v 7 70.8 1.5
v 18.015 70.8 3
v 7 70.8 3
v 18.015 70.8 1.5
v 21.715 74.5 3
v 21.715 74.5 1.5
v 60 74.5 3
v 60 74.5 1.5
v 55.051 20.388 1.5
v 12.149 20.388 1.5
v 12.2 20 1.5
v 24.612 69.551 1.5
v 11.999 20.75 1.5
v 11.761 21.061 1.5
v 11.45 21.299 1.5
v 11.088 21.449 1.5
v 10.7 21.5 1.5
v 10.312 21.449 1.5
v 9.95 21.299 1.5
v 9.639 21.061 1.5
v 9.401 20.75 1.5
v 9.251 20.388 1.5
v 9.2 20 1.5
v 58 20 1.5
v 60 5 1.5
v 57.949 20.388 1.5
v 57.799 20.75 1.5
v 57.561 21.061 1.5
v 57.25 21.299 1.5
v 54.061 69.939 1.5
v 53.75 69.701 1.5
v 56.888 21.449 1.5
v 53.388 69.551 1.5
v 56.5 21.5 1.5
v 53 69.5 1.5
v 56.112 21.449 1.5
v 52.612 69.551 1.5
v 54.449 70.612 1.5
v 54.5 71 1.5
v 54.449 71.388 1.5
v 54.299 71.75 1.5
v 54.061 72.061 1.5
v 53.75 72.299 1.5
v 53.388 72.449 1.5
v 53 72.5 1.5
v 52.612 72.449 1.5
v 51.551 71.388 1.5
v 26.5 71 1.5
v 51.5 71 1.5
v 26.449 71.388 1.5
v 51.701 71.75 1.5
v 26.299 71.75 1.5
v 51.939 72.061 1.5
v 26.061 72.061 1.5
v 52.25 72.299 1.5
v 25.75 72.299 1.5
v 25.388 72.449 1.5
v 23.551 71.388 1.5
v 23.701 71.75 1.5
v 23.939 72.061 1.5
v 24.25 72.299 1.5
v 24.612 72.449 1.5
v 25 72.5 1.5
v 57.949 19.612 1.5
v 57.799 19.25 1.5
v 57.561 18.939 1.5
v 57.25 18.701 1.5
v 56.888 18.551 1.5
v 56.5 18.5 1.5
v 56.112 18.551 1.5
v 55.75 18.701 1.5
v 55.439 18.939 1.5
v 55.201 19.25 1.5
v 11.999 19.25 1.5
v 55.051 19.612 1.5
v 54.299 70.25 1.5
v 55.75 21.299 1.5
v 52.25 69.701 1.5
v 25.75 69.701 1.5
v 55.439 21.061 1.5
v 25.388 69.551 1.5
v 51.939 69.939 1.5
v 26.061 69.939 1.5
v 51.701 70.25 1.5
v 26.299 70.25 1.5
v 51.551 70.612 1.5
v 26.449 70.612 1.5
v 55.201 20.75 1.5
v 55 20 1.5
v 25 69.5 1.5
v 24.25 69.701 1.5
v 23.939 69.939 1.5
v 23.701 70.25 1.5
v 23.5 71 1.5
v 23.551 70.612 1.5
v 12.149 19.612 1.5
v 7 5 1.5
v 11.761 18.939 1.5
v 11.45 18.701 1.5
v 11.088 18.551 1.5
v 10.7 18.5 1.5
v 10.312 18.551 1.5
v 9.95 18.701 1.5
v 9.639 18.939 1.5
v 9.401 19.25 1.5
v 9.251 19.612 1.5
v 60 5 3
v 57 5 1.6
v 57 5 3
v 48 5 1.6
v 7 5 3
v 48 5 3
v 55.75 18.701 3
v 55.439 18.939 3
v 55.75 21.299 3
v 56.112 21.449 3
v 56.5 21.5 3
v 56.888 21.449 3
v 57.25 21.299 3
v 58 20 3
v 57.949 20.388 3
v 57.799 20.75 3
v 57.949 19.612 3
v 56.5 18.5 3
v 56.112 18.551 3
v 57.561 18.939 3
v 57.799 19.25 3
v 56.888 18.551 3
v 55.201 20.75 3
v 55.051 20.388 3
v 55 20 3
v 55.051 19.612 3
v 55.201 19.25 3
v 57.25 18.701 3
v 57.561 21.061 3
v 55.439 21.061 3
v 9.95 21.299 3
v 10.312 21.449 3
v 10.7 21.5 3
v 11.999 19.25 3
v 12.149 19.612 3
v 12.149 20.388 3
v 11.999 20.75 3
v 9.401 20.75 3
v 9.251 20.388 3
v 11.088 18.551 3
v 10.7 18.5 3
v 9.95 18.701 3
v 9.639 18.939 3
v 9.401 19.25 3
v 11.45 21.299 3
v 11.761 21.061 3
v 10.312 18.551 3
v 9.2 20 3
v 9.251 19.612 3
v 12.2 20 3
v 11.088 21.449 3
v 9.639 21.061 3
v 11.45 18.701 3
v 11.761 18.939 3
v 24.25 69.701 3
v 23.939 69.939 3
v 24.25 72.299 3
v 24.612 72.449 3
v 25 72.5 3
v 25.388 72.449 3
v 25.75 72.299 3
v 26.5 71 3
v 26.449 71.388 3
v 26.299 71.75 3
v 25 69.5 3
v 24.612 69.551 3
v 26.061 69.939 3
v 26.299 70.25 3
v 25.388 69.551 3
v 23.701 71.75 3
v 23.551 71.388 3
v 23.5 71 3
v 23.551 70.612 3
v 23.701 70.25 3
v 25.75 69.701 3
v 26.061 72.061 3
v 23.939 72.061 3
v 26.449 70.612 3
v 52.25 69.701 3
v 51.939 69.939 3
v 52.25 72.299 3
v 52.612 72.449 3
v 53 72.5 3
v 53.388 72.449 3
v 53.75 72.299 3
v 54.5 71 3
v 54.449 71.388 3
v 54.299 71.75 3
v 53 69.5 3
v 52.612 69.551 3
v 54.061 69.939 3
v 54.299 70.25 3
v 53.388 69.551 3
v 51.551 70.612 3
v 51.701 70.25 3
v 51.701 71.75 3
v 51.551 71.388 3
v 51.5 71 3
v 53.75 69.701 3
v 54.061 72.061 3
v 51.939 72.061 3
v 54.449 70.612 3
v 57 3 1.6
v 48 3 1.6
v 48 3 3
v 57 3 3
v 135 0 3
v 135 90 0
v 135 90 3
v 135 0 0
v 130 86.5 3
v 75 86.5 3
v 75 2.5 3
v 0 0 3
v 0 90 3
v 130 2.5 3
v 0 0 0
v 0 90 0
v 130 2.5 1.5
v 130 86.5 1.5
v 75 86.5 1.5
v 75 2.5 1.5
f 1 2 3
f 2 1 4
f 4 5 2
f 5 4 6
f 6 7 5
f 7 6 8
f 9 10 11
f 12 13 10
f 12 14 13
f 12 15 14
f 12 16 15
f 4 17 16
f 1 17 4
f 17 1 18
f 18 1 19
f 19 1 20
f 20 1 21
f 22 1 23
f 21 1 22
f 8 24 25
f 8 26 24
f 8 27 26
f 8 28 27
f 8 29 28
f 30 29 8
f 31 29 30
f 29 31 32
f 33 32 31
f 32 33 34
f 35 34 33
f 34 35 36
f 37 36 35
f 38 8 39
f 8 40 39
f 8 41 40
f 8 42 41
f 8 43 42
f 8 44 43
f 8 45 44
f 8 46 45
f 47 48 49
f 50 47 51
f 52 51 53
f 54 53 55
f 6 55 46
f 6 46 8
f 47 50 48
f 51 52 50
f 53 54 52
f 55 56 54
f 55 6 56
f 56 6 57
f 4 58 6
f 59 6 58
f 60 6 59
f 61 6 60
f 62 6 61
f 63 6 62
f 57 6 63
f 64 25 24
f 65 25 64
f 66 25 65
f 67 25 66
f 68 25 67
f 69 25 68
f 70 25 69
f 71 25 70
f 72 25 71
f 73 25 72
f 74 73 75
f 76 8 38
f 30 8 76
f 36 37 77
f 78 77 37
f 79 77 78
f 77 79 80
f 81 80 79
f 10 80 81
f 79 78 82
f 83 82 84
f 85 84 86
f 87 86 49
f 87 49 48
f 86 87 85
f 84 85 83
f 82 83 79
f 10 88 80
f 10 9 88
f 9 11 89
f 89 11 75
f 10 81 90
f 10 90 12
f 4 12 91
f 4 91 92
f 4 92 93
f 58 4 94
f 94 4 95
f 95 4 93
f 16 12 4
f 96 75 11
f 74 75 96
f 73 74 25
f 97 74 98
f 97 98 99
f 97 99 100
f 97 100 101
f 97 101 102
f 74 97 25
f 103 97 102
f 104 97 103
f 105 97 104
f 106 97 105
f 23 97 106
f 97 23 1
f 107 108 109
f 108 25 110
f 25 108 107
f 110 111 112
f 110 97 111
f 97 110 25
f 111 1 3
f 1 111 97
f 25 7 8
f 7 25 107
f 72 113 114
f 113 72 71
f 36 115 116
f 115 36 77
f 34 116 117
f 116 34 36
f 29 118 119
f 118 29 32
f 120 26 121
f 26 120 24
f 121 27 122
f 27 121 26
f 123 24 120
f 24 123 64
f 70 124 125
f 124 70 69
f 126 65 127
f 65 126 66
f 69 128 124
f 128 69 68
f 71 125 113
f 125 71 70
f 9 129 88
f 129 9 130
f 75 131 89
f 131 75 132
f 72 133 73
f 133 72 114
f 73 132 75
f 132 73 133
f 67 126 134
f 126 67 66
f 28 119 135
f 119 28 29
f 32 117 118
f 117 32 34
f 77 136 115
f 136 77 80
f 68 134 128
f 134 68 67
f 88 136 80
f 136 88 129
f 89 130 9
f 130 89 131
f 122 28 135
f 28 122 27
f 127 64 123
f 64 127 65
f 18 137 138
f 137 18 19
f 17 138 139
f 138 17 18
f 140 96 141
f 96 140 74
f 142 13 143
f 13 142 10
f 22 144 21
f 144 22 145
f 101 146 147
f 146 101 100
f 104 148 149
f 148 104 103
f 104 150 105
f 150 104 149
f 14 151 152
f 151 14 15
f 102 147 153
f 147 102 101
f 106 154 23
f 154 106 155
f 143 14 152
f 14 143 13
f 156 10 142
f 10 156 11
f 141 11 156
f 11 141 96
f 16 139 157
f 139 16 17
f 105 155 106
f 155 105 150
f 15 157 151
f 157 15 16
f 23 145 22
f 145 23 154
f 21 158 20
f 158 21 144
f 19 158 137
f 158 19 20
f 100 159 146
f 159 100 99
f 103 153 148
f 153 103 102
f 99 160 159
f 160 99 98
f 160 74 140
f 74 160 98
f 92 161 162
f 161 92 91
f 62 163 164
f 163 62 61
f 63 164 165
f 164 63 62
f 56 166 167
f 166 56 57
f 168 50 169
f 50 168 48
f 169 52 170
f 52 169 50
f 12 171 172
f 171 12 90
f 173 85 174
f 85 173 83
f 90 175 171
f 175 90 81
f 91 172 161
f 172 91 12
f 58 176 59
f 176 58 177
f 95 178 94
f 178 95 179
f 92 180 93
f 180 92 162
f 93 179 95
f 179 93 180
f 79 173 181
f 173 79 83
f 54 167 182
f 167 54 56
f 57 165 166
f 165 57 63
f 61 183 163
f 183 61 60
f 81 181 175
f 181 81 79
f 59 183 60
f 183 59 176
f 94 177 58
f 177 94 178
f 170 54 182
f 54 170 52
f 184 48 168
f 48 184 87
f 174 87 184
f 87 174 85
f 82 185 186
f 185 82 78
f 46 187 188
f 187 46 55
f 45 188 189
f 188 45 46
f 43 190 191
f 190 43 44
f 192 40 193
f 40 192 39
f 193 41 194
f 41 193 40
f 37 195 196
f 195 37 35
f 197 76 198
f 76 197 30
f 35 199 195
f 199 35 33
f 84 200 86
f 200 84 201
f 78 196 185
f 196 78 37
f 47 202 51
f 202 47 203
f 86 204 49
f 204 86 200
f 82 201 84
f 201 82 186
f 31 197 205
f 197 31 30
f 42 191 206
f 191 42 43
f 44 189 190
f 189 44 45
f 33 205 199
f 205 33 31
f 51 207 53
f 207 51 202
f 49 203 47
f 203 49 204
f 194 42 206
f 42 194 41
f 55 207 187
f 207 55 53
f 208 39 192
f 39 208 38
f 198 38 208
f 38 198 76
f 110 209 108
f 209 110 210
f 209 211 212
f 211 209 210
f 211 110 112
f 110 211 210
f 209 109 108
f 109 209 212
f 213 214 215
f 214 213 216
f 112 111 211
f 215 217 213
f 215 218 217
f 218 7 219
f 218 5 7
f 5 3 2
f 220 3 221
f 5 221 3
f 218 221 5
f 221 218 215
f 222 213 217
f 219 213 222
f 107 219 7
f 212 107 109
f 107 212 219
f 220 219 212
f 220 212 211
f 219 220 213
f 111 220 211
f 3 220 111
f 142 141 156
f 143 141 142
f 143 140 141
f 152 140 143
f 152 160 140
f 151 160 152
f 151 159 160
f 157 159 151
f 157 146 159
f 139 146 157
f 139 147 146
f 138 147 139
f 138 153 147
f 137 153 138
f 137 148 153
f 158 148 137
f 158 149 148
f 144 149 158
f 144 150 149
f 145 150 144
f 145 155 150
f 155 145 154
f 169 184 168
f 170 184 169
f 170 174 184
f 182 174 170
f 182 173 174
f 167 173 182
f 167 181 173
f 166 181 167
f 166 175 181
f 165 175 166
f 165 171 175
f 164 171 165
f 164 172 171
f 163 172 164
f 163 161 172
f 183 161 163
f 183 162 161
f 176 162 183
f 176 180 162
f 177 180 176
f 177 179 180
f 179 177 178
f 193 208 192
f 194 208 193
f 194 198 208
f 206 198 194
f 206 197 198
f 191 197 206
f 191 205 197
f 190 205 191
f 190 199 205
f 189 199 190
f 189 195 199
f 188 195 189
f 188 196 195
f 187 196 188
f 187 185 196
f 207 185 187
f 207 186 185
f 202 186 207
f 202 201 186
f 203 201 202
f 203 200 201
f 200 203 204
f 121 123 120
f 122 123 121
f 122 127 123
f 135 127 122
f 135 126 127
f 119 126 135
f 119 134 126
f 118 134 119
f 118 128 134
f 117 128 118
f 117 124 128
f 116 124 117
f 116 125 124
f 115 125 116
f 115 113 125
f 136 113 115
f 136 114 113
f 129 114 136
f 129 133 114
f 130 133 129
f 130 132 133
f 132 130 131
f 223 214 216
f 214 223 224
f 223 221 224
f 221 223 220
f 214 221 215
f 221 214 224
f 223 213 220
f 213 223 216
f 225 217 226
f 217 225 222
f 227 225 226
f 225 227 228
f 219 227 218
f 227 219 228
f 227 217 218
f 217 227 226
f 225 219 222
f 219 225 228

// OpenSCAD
// file: arduino_uno.scad
board_lenght = 53;
board_wide = 69.5;
board_thick = 1.7;

screw_hole_r = 1.5;

module screw_hole() {
	cylinder(h = 3, r = screw_hole_r);
}

module arduino_uno_board() {
	union() {

		// Circuit board
		color("SteelBlue")
			difference() {
				cube([board_wide, board_lenght, board_thick]); // Base board

				// Remove the screw holes
				translate([15, 3.5, -0.5])
					screw_hole();
				translate([15, 49.3, -0.5])
					screw_hole();
				translate([66, 35, -0.5])
					screw_hole();
				translate([66, 7, -0.5])
					screw_hole();
				
				// Small hole top right
				translate([65.8, 37.5, -0.5])
					difference() { 
						cube([5, 20.5, 2.5]);

						translate([0, -4, -0.5])
							rotate([0, 0, 45])
								cube(6);
					}

				// Arduino label
				translate([board_wide / 3, board_lenght / 1.5, board_thick])
					text("ARDUINO UNO", board_lenght / 15, "Console");
			}

		

		// USB A port
		color("Silver")
			translate([-6, 32.2, board_thick-0.1])
				cube([16.4, 12, 10.7]);
		
		// Power supply
		color("black")
			translate([-2, 3, 0.1])
				cube([13.5, 9, 12.5]);
	}
}
// main file
include <arduino_uno.scad>

$fa = 1;
$fs = 0.4;

difference() {
    cube(size=[135, 90, 3]);

    translate([60, 5, 1.5])
        rotate([0, 0, 90])
        arduino_uno_board();

    translate([75, 2.5, 1.5])
        color("white")
        cube([55, 84, 10]);

    translate([62.5, 62.5, 2.6])
        rotate([0, 0, 270])
            text("Arduino");
}
